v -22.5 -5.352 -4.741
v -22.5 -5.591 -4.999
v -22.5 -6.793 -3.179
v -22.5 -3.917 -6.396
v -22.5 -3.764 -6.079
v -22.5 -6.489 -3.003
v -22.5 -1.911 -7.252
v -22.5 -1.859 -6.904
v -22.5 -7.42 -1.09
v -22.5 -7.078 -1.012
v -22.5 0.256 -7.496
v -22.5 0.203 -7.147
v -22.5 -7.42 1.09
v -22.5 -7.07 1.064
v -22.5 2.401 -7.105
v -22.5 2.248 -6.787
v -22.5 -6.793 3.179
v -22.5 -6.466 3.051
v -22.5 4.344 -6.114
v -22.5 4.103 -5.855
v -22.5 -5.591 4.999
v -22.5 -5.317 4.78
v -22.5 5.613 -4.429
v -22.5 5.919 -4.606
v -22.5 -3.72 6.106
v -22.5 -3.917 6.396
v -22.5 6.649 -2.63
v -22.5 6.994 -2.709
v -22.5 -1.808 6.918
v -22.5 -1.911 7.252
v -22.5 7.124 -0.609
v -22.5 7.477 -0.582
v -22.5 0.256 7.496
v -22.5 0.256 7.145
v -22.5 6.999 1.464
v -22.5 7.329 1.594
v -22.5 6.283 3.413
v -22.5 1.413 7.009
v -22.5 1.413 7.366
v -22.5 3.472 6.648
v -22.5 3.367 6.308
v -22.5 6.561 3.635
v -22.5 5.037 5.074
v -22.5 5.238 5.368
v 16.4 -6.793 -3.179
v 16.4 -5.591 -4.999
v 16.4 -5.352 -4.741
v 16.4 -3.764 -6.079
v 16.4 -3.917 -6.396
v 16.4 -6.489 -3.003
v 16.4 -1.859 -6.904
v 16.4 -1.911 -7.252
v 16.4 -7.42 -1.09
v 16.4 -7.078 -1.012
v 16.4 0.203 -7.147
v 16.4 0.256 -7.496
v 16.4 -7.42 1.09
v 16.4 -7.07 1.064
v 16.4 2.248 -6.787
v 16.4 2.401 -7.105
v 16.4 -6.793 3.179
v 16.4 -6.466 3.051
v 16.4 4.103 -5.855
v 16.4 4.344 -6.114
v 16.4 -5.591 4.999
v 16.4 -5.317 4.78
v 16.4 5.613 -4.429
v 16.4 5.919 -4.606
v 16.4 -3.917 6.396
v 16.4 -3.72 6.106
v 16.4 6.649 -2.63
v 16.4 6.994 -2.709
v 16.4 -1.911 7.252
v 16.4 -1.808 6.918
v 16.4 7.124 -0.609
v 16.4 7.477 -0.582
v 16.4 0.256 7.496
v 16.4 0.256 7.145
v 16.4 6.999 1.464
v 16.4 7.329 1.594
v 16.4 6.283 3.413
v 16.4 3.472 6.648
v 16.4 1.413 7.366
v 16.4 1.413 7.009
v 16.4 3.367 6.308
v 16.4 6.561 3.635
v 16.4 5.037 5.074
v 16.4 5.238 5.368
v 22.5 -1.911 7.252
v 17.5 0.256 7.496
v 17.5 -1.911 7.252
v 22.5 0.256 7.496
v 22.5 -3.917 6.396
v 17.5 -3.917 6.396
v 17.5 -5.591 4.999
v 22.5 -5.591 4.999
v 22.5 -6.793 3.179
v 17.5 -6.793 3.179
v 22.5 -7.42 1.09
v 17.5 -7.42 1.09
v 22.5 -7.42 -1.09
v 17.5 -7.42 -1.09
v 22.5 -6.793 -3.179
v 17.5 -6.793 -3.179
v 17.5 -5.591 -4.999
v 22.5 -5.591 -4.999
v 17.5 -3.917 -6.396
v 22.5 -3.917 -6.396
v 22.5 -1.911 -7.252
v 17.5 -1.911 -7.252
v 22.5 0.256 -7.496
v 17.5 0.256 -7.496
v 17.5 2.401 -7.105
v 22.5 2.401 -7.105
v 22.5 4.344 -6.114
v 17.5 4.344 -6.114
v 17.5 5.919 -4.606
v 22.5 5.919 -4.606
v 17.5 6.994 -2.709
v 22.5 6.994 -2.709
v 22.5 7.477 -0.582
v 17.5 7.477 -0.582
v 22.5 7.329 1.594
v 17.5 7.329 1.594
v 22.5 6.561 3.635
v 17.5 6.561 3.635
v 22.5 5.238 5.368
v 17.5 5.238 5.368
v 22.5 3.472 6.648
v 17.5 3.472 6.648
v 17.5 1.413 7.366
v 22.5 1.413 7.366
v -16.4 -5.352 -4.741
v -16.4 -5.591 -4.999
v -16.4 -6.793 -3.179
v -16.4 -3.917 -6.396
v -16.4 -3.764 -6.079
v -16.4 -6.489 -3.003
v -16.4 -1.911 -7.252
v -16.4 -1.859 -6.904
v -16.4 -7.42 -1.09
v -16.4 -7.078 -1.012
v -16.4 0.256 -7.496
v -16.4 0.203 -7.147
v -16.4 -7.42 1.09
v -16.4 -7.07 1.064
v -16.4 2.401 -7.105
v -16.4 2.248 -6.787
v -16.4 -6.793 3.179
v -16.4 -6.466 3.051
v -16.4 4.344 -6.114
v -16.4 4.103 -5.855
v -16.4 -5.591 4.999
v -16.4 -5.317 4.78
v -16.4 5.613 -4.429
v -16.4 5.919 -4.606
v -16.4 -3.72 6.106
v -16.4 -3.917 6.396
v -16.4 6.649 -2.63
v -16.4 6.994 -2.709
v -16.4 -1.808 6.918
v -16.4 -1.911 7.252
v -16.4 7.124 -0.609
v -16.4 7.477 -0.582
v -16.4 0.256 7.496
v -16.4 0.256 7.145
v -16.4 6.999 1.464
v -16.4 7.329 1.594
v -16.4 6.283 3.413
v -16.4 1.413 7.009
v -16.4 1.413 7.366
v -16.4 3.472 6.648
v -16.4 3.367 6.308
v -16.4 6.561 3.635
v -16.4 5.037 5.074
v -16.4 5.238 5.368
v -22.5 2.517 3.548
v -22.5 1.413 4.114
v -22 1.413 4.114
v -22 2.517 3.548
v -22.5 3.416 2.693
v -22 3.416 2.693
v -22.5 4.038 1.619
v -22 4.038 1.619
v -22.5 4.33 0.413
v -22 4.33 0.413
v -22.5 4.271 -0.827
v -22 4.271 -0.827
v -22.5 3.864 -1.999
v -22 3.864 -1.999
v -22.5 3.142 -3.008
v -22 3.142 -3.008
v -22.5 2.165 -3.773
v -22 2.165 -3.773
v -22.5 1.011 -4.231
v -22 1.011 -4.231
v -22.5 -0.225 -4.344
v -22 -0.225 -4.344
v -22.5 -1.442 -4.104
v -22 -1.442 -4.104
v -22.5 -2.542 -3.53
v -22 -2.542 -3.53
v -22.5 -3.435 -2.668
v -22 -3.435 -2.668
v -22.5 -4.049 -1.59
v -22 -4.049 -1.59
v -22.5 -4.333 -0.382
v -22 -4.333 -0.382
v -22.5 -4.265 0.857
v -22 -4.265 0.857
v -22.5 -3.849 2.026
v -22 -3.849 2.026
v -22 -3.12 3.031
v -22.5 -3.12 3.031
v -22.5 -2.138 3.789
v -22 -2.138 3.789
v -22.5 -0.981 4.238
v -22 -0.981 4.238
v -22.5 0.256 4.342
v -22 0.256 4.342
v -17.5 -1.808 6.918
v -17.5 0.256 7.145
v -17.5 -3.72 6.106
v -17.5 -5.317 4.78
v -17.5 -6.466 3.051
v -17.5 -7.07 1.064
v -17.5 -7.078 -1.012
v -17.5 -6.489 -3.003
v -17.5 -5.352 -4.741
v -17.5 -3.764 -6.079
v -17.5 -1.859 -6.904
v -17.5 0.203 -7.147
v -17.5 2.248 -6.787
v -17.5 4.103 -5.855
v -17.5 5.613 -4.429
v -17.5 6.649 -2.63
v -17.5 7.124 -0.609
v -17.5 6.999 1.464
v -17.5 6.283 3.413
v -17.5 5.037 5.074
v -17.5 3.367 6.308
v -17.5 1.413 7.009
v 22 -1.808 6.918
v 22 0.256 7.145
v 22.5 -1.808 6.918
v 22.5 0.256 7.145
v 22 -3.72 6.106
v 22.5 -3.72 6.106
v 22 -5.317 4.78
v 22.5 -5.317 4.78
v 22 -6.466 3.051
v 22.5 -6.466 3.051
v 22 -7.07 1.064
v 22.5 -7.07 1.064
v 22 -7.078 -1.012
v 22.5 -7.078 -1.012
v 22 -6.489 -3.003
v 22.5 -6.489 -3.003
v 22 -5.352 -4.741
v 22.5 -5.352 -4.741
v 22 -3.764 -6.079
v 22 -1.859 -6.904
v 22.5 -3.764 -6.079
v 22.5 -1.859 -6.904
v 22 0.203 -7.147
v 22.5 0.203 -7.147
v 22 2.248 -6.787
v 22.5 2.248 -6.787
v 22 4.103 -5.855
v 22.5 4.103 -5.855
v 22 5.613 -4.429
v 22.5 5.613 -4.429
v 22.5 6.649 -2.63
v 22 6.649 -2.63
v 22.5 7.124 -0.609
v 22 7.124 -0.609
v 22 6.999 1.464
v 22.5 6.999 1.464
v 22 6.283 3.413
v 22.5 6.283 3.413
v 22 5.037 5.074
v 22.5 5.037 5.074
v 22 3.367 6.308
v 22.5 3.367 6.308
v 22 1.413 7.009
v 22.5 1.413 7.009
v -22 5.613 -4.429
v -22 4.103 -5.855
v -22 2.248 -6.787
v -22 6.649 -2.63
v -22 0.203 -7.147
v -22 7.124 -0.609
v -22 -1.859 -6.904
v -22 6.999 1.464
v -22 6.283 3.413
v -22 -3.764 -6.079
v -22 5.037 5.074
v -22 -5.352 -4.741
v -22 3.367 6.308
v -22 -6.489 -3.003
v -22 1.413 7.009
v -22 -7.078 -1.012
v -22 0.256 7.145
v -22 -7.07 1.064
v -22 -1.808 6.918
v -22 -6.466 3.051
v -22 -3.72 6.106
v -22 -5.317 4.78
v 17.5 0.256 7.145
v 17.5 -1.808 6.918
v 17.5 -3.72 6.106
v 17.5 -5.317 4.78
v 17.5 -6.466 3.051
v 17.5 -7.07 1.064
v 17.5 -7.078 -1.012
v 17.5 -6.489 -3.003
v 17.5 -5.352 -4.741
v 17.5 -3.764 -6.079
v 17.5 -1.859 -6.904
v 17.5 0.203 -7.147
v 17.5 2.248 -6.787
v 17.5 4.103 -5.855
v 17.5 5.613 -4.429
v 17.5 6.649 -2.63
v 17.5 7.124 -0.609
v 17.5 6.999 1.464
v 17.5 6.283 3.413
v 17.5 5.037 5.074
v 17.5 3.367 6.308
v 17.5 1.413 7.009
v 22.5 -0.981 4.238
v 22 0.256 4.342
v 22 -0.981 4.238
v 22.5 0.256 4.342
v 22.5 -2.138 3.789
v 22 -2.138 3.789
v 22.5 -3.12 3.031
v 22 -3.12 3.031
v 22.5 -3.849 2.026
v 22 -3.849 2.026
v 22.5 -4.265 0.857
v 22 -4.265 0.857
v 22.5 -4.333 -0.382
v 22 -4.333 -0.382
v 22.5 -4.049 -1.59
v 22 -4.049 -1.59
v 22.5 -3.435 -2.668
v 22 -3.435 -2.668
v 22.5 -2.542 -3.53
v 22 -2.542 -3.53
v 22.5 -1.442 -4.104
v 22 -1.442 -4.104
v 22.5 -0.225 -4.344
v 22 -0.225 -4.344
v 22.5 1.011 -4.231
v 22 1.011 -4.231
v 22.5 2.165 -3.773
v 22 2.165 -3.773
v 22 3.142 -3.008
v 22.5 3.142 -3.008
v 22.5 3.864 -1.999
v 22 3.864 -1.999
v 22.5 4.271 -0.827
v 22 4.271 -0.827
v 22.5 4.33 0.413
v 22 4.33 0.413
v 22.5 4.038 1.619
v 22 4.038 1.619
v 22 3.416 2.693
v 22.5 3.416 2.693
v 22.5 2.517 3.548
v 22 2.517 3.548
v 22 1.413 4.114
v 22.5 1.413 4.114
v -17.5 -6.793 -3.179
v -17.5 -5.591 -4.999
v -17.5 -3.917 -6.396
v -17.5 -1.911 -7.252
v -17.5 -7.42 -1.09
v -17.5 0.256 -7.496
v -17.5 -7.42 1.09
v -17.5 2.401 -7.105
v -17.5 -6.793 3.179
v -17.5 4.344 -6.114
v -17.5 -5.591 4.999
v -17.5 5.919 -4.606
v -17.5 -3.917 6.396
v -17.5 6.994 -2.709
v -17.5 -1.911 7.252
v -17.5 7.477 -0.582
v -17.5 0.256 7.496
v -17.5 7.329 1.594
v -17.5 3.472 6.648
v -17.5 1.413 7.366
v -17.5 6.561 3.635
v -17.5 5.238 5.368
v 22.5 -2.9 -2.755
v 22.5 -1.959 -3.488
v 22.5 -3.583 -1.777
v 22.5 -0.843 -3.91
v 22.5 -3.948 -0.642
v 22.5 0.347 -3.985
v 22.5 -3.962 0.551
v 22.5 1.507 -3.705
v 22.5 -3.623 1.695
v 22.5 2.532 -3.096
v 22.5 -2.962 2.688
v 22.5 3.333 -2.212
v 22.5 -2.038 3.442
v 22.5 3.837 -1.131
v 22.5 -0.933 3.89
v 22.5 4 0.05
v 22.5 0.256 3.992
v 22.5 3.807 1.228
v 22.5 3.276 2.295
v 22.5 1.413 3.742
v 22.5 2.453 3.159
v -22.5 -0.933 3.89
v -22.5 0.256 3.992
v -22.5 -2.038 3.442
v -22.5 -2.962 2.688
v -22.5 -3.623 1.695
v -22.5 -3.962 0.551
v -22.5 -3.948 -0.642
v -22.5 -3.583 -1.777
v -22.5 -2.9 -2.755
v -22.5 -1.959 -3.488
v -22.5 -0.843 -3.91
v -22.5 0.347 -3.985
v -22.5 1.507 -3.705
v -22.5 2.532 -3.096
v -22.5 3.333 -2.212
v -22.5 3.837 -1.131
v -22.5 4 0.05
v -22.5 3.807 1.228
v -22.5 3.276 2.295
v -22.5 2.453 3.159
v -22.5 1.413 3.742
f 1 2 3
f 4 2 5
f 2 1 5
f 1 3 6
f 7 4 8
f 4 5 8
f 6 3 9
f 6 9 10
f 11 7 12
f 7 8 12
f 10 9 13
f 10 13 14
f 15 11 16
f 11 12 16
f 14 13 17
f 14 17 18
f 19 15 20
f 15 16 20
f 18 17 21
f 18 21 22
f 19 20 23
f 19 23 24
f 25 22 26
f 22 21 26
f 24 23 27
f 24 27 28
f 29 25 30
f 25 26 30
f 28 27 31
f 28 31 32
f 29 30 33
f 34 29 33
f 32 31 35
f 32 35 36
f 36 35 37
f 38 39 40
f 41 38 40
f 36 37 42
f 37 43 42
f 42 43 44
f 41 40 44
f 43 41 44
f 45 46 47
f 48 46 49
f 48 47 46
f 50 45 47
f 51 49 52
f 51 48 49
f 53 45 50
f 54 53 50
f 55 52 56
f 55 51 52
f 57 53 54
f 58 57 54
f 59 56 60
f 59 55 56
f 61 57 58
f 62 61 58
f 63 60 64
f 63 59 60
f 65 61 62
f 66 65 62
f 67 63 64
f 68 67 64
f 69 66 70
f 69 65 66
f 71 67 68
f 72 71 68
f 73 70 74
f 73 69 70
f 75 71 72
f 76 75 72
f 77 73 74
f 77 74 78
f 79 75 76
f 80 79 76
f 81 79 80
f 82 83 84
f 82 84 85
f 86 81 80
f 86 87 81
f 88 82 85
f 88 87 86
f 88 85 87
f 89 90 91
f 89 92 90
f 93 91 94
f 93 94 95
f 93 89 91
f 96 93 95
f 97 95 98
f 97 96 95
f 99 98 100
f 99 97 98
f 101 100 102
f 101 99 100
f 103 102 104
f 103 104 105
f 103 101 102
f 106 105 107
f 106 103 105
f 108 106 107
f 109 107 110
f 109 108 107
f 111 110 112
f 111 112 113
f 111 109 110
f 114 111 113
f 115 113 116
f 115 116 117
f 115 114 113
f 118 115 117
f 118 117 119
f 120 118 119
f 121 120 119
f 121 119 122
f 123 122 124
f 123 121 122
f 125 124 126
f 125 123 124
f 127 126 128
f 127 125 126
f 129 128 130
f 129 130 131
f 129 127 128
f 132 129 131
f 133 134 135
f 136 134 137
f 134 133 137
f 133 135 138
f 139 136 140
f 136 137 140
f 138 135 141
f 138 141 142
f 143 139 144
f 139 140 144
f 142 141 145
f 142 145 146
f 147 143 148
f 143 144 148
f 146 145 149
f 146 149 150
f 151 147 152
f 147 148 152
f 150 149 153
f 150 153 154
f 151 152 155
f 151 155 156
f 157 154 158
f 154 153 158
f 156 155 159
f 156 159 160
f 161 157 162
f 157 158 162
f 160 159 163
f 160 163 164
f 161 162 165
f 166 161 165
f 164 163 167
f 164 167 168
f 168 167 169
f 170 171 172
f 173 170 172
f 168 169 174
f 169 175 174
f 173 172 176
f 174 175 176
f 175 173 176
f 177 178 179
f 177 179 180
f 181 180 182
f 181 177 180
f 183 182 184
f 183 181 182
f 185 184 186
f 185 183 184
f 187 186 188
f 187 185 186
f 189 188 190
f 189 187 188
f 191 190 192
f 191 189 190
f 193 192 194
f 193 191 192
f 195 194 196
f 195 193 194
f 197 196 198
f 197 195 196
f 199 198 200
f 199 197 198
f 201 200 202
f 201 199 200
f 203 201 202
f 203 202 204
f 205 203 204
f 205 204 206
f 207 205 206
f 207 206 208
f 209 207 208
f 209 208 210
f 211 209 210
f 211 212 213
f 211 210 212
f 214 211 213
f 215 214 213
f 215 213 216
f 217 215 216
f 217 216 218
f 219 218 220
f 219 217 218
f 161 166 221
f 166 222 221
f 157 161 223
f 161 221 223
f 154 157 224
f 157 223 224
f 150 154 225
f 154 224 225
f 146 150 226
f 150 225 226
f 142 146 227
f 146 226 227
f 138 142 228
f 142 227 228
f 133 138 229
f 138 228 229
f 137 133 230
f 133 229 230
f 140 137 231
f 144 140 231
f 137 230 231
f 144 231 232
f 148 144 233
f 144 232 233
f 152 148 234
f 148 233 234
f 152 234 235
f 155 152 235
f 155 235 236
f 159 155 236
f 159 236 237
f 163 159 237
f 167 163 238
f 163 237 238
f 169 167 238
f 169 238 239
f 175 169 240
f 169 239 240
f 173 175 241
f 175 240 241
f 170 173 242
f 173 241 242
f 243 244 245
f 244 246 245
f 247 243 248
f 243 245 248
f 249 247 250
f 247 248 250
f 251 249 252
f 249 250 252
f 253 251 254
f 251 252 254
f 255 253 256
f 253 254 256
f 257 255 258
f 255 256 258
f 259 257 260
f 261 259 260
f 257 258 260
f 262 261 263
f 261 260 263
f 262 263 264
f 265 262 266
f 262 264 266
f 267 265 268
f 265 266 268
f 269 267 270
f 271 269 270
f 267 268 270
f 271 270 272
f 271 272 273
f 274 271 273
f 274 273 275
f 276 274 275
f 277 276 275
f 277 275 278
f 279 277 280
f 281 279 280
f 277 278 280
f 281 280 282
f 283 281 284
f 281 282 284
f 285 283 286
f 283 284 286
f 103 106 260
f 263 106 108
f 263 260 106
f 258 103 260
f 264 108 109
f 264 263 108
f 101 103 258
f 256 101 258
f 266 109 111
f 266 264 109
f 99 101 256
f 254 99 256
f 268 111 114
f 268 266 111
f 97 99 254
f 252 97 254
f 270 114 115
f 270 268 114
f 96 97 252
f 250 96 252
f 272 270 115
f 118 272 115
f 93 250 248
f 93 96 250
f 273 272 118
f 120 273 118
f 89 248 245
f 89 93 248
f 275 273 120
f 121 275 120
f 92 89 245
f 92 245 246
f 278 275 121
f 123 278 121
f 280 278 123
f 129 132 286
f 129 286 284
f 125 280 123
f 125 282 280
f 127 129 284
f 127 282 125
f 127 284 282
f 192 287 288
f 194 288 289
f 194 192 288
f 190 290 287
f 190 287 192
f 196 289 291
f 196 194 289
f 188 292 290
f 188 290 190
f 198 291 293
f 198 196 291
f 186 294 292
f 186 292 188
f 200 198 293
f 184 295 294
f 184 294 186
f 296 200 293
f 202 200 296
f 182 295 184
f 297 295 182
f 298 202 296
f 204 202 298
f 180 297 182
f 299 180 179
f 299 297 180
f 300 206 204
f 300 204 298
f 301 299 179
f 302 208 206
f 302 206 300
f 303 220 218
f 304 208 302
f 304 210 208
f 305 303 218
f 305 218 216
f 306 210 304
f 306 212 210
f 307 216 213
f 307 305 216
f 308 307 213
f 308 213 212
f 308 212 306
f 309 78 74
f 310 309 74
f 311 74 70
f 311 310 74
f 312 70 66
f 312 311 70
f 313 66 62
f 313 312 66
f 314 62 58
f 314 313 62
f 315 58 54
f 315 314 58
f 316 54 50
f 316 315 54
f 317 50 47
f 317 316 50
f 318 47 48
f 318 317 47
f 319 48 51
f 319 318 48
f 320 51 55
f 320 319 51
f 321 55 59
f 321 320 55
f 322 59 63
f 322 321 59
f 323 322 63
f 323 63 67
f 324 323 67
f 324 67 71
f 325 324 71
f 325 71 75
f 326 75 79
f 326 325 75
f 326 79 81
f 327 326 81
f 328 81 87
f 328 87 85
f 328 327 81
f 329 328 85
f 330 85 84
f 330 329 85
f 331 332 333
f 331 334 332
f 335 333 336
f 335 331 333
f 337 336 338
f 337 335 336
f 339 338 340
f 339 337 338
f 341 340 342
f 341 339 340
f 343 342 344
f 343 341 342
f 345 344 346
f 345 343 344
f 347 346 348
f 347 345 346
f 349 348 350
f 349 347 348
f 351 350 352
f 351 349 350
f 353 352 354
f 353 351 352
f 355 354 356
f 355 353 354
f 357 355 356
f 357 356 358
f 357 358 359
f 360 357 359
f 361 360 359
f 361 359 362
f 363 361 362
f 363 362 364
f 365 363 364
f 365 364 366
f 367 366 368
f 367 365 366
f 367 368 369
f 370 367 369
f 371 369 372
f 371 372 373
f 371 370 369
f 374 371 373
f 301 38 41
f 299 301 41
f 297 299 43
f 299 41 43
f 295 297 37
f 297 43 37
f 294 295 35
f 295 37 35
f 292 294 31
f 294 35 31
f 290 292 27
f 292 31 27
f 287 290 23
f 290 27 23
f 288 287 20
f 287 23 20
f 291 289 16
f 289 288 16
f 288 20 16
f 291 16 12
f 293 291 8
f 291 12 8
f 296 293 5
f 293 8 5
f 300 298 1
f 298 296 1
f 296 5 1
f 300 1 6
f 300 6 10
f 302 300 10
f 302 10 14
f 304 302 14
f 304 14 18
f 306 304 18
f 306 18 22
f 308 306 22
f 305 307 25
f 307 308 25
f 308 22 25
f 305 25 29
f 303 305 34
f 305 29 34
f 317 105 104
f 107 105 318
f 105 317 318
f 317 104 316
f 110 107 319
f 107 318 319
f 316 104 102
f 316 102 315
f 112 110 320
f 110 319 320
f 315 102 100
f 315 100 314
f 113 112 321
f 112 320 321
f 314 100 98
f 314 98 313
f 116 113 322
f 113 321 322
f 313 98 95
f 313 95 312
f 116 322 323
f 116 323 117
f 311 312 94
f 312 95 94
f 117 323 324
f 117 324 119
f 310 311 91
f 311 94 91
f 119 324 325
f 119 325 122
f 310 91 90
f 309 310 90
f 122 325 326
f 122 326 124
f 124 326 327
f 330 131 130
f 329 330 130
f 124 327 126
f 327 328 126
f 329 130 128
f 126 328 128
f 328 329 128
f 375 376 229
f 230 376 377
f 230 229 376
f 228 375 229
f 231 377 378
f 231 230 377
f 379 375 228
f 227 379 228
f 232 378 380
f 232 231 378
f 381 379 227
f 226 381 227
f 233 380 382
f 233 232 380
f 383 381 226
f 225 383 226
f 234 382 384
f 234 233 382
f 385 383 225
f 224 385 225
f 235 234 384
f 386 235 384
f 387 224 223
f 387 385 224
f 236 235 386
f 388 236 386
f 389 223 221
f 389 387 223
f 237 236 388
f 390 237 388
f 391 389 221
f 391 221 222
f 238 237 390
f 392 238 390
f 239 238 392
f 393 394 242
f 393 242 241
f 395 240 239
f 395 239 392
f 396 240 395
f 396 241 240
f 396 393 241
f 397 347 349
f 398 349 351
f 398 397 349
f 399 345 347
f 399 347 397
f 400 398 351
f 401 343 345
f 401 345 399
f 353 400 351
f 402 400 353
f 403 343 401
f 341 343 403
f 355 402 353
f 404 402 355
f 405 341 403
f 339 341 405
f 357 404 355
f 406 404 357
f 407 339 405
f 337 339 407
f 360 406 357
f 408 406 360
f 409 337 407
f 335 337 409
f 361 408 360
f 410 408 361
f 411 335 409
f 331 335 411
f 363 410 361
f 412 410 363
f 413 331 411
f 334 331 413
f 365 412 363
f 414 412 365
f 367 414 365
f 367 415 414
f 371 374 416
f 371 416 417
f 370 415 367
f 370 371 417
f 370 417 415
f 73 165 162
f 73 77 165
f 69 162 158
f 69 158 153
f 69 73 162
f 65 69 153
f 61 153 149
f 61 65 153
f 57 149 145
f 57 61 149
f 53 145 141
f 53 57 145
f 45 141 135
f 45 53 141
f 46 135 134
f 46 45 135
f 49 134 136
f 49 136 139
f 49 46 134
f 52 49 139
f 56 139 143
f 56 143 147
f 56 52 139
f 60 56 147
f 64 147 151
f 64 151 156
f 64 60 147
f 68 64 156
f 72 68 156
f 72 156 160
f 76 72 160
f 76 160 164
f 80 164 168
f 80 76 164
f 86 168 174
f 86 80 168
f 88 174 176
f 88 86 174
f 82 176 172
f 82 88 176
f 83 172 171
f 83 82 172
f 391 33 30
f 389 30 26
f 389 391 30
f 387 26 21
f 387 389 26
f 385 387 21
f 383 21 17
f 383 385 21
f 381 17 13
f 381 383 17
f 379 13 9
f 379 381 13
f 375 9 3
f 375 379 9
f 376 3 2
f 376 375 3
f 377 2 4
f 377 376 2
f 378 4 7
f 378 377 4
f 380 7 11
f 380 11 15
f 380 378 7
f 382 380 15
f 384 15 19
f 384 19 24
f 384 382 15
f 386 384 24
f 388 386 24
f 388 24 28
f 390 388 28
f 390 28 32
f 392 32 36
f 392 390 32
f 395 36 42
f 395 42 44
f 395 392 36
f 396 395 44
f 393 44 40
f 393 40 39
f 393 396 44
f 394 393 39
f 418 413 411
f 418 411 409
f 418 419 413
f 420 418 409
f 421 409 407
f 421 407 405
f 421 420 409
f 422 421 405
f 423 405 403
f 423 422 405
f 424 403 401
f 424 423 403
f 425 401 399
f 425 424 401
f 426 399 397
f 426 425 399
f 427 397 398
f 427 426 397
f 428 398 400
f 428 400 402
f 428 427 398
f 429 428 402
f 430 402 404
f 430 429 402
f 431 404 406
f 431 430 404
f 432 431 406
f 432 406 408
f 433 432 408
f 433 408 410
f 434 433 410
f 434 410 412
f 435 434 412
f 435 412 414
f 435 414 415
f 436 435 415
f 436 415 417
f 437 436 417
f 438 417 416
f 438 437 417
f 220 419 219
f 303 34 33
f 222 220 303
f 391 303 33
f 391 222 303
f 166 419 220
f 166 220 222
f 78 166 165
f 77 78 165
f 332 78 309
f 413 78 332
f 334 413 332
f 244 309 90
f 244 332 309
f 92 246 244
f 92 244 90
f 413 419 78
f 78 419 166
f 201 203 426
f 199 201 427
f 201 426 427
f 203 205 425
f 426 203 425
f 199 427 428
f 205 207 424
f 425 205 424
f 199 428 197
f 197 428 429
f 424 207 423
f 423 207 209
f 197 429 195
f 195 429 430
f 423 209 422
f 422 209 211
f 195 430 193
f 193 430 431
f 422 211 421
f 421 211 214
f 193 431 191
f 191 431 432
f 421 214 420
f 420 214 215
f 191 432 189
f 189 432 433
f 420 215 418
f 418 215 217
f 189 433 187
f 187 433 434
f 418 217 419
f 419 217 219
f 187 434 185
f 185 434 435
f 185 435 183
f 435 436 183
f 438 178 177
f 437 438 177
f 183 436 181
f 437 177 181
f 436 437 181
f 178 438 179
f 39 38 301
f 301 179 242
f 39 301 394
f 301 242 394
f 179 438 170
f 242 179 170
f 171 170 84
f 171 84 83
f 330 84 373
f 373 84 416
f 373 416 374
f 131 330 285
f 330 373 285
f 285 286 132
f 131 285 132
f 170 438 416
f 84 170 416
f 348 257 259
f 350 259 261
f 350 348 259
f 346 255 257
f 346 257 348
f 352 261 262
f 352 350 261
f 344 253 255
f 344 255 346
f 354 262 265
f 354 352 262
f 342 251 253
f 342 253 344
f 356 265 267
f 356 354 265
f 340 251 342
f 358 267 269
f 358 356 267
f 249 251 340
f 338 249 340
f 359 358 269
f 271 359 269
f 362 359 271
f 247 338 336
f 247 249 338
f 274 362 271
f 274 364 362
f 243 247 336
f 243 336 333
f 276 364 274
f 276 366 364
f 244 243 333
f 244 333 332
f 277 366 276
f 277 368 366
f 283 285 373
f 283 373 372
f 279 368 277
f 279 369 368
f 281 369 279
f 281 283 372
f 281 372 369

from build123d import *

# Parameters (mm, degrees)
F0_R      = 7.5
F0_R_2    = 4
F1_DEPTH  = 22.5
F4_R      = 8
F4_R_2    = 7.15
F5_DEPTH  = 1.1
F6_R      = 8
F6_R_2    = 7.15
F7_DEPTH  = 1.1
F8_R      = 7.15
F8_R_2    = 4.35
F9_DEPTH  = 0.5
F11_R     = 7.15
F11_R_2   = 4.35
F12_DEPTH = 0.5
F13_W     = 1.1570598217
F13_H     = 15.1530206203
F14_DEPTH = 499.5


with BuildPart() as f1:
    # F0 (on Right) → F1 (new body, symmetric)
    with BuildSketch(Plane.YZ):
        Circle(F0_R)
        Circle(F0_R_2, mode=Mode.SUBTRACT)
    extrude(amount=F1_DEPTH, both=True)

    # F4 (on offset) → F5 (cut)
    with BuildSketch(Plane.YZ.offset(-17.5)):
        Circle(F4_R)
        Circle(F4_R_2, mode=Mode.SUBTRACT)
    extrude(amount=F5_DEPTH, mode=Mode.SUBTRACT)

    # F6 (on offset) → F7 (cut)
    with BuildSketch(Plane.YZ.offset(17.5)):
        Circle(F6_R)
        Circle(F6_R_2, mode=Mode.SUBTRACT)
    extrude(amount=-F7_DEPTH, mode=Mode.SUBTRACT)

    # F8 (on face) → F9 (cut)
    with BuildSketch(Plane.YZ.offset(22.5)):
        Circle(F8_R)
        Circle(F8_R_2, mode=Mode.SUBTRACT)
    extrude(amount=-F9_DEPTH, mode=Mode.SUBTRACT)

    # F11 (on face) → F12 (cut)
    with BuildSketch(Plane(origin=(-22.5, 0, 0), x_dir=(0, -1, 0), z_dir=(-1, 0, 0))):
        Circle(F11_R)
        Circle(F11_R_2, mode=Mode.SUBTRACT)
    extrude(amount=-F12_DEPTH, mode=Mode.SUBTRACT)

    # F13 (on face) → F14 (cut, symmetric)
    with BuildSketch(Plane.YZ.offset(22)):
        with Locations((0.8341596586, 7.5765103102)):
            Rectangle(F13_W, F13_H)
    extrude(amount=F14_DEPTH, both=True, mode=Mode.SUBTRACT)


solid = f1.part
